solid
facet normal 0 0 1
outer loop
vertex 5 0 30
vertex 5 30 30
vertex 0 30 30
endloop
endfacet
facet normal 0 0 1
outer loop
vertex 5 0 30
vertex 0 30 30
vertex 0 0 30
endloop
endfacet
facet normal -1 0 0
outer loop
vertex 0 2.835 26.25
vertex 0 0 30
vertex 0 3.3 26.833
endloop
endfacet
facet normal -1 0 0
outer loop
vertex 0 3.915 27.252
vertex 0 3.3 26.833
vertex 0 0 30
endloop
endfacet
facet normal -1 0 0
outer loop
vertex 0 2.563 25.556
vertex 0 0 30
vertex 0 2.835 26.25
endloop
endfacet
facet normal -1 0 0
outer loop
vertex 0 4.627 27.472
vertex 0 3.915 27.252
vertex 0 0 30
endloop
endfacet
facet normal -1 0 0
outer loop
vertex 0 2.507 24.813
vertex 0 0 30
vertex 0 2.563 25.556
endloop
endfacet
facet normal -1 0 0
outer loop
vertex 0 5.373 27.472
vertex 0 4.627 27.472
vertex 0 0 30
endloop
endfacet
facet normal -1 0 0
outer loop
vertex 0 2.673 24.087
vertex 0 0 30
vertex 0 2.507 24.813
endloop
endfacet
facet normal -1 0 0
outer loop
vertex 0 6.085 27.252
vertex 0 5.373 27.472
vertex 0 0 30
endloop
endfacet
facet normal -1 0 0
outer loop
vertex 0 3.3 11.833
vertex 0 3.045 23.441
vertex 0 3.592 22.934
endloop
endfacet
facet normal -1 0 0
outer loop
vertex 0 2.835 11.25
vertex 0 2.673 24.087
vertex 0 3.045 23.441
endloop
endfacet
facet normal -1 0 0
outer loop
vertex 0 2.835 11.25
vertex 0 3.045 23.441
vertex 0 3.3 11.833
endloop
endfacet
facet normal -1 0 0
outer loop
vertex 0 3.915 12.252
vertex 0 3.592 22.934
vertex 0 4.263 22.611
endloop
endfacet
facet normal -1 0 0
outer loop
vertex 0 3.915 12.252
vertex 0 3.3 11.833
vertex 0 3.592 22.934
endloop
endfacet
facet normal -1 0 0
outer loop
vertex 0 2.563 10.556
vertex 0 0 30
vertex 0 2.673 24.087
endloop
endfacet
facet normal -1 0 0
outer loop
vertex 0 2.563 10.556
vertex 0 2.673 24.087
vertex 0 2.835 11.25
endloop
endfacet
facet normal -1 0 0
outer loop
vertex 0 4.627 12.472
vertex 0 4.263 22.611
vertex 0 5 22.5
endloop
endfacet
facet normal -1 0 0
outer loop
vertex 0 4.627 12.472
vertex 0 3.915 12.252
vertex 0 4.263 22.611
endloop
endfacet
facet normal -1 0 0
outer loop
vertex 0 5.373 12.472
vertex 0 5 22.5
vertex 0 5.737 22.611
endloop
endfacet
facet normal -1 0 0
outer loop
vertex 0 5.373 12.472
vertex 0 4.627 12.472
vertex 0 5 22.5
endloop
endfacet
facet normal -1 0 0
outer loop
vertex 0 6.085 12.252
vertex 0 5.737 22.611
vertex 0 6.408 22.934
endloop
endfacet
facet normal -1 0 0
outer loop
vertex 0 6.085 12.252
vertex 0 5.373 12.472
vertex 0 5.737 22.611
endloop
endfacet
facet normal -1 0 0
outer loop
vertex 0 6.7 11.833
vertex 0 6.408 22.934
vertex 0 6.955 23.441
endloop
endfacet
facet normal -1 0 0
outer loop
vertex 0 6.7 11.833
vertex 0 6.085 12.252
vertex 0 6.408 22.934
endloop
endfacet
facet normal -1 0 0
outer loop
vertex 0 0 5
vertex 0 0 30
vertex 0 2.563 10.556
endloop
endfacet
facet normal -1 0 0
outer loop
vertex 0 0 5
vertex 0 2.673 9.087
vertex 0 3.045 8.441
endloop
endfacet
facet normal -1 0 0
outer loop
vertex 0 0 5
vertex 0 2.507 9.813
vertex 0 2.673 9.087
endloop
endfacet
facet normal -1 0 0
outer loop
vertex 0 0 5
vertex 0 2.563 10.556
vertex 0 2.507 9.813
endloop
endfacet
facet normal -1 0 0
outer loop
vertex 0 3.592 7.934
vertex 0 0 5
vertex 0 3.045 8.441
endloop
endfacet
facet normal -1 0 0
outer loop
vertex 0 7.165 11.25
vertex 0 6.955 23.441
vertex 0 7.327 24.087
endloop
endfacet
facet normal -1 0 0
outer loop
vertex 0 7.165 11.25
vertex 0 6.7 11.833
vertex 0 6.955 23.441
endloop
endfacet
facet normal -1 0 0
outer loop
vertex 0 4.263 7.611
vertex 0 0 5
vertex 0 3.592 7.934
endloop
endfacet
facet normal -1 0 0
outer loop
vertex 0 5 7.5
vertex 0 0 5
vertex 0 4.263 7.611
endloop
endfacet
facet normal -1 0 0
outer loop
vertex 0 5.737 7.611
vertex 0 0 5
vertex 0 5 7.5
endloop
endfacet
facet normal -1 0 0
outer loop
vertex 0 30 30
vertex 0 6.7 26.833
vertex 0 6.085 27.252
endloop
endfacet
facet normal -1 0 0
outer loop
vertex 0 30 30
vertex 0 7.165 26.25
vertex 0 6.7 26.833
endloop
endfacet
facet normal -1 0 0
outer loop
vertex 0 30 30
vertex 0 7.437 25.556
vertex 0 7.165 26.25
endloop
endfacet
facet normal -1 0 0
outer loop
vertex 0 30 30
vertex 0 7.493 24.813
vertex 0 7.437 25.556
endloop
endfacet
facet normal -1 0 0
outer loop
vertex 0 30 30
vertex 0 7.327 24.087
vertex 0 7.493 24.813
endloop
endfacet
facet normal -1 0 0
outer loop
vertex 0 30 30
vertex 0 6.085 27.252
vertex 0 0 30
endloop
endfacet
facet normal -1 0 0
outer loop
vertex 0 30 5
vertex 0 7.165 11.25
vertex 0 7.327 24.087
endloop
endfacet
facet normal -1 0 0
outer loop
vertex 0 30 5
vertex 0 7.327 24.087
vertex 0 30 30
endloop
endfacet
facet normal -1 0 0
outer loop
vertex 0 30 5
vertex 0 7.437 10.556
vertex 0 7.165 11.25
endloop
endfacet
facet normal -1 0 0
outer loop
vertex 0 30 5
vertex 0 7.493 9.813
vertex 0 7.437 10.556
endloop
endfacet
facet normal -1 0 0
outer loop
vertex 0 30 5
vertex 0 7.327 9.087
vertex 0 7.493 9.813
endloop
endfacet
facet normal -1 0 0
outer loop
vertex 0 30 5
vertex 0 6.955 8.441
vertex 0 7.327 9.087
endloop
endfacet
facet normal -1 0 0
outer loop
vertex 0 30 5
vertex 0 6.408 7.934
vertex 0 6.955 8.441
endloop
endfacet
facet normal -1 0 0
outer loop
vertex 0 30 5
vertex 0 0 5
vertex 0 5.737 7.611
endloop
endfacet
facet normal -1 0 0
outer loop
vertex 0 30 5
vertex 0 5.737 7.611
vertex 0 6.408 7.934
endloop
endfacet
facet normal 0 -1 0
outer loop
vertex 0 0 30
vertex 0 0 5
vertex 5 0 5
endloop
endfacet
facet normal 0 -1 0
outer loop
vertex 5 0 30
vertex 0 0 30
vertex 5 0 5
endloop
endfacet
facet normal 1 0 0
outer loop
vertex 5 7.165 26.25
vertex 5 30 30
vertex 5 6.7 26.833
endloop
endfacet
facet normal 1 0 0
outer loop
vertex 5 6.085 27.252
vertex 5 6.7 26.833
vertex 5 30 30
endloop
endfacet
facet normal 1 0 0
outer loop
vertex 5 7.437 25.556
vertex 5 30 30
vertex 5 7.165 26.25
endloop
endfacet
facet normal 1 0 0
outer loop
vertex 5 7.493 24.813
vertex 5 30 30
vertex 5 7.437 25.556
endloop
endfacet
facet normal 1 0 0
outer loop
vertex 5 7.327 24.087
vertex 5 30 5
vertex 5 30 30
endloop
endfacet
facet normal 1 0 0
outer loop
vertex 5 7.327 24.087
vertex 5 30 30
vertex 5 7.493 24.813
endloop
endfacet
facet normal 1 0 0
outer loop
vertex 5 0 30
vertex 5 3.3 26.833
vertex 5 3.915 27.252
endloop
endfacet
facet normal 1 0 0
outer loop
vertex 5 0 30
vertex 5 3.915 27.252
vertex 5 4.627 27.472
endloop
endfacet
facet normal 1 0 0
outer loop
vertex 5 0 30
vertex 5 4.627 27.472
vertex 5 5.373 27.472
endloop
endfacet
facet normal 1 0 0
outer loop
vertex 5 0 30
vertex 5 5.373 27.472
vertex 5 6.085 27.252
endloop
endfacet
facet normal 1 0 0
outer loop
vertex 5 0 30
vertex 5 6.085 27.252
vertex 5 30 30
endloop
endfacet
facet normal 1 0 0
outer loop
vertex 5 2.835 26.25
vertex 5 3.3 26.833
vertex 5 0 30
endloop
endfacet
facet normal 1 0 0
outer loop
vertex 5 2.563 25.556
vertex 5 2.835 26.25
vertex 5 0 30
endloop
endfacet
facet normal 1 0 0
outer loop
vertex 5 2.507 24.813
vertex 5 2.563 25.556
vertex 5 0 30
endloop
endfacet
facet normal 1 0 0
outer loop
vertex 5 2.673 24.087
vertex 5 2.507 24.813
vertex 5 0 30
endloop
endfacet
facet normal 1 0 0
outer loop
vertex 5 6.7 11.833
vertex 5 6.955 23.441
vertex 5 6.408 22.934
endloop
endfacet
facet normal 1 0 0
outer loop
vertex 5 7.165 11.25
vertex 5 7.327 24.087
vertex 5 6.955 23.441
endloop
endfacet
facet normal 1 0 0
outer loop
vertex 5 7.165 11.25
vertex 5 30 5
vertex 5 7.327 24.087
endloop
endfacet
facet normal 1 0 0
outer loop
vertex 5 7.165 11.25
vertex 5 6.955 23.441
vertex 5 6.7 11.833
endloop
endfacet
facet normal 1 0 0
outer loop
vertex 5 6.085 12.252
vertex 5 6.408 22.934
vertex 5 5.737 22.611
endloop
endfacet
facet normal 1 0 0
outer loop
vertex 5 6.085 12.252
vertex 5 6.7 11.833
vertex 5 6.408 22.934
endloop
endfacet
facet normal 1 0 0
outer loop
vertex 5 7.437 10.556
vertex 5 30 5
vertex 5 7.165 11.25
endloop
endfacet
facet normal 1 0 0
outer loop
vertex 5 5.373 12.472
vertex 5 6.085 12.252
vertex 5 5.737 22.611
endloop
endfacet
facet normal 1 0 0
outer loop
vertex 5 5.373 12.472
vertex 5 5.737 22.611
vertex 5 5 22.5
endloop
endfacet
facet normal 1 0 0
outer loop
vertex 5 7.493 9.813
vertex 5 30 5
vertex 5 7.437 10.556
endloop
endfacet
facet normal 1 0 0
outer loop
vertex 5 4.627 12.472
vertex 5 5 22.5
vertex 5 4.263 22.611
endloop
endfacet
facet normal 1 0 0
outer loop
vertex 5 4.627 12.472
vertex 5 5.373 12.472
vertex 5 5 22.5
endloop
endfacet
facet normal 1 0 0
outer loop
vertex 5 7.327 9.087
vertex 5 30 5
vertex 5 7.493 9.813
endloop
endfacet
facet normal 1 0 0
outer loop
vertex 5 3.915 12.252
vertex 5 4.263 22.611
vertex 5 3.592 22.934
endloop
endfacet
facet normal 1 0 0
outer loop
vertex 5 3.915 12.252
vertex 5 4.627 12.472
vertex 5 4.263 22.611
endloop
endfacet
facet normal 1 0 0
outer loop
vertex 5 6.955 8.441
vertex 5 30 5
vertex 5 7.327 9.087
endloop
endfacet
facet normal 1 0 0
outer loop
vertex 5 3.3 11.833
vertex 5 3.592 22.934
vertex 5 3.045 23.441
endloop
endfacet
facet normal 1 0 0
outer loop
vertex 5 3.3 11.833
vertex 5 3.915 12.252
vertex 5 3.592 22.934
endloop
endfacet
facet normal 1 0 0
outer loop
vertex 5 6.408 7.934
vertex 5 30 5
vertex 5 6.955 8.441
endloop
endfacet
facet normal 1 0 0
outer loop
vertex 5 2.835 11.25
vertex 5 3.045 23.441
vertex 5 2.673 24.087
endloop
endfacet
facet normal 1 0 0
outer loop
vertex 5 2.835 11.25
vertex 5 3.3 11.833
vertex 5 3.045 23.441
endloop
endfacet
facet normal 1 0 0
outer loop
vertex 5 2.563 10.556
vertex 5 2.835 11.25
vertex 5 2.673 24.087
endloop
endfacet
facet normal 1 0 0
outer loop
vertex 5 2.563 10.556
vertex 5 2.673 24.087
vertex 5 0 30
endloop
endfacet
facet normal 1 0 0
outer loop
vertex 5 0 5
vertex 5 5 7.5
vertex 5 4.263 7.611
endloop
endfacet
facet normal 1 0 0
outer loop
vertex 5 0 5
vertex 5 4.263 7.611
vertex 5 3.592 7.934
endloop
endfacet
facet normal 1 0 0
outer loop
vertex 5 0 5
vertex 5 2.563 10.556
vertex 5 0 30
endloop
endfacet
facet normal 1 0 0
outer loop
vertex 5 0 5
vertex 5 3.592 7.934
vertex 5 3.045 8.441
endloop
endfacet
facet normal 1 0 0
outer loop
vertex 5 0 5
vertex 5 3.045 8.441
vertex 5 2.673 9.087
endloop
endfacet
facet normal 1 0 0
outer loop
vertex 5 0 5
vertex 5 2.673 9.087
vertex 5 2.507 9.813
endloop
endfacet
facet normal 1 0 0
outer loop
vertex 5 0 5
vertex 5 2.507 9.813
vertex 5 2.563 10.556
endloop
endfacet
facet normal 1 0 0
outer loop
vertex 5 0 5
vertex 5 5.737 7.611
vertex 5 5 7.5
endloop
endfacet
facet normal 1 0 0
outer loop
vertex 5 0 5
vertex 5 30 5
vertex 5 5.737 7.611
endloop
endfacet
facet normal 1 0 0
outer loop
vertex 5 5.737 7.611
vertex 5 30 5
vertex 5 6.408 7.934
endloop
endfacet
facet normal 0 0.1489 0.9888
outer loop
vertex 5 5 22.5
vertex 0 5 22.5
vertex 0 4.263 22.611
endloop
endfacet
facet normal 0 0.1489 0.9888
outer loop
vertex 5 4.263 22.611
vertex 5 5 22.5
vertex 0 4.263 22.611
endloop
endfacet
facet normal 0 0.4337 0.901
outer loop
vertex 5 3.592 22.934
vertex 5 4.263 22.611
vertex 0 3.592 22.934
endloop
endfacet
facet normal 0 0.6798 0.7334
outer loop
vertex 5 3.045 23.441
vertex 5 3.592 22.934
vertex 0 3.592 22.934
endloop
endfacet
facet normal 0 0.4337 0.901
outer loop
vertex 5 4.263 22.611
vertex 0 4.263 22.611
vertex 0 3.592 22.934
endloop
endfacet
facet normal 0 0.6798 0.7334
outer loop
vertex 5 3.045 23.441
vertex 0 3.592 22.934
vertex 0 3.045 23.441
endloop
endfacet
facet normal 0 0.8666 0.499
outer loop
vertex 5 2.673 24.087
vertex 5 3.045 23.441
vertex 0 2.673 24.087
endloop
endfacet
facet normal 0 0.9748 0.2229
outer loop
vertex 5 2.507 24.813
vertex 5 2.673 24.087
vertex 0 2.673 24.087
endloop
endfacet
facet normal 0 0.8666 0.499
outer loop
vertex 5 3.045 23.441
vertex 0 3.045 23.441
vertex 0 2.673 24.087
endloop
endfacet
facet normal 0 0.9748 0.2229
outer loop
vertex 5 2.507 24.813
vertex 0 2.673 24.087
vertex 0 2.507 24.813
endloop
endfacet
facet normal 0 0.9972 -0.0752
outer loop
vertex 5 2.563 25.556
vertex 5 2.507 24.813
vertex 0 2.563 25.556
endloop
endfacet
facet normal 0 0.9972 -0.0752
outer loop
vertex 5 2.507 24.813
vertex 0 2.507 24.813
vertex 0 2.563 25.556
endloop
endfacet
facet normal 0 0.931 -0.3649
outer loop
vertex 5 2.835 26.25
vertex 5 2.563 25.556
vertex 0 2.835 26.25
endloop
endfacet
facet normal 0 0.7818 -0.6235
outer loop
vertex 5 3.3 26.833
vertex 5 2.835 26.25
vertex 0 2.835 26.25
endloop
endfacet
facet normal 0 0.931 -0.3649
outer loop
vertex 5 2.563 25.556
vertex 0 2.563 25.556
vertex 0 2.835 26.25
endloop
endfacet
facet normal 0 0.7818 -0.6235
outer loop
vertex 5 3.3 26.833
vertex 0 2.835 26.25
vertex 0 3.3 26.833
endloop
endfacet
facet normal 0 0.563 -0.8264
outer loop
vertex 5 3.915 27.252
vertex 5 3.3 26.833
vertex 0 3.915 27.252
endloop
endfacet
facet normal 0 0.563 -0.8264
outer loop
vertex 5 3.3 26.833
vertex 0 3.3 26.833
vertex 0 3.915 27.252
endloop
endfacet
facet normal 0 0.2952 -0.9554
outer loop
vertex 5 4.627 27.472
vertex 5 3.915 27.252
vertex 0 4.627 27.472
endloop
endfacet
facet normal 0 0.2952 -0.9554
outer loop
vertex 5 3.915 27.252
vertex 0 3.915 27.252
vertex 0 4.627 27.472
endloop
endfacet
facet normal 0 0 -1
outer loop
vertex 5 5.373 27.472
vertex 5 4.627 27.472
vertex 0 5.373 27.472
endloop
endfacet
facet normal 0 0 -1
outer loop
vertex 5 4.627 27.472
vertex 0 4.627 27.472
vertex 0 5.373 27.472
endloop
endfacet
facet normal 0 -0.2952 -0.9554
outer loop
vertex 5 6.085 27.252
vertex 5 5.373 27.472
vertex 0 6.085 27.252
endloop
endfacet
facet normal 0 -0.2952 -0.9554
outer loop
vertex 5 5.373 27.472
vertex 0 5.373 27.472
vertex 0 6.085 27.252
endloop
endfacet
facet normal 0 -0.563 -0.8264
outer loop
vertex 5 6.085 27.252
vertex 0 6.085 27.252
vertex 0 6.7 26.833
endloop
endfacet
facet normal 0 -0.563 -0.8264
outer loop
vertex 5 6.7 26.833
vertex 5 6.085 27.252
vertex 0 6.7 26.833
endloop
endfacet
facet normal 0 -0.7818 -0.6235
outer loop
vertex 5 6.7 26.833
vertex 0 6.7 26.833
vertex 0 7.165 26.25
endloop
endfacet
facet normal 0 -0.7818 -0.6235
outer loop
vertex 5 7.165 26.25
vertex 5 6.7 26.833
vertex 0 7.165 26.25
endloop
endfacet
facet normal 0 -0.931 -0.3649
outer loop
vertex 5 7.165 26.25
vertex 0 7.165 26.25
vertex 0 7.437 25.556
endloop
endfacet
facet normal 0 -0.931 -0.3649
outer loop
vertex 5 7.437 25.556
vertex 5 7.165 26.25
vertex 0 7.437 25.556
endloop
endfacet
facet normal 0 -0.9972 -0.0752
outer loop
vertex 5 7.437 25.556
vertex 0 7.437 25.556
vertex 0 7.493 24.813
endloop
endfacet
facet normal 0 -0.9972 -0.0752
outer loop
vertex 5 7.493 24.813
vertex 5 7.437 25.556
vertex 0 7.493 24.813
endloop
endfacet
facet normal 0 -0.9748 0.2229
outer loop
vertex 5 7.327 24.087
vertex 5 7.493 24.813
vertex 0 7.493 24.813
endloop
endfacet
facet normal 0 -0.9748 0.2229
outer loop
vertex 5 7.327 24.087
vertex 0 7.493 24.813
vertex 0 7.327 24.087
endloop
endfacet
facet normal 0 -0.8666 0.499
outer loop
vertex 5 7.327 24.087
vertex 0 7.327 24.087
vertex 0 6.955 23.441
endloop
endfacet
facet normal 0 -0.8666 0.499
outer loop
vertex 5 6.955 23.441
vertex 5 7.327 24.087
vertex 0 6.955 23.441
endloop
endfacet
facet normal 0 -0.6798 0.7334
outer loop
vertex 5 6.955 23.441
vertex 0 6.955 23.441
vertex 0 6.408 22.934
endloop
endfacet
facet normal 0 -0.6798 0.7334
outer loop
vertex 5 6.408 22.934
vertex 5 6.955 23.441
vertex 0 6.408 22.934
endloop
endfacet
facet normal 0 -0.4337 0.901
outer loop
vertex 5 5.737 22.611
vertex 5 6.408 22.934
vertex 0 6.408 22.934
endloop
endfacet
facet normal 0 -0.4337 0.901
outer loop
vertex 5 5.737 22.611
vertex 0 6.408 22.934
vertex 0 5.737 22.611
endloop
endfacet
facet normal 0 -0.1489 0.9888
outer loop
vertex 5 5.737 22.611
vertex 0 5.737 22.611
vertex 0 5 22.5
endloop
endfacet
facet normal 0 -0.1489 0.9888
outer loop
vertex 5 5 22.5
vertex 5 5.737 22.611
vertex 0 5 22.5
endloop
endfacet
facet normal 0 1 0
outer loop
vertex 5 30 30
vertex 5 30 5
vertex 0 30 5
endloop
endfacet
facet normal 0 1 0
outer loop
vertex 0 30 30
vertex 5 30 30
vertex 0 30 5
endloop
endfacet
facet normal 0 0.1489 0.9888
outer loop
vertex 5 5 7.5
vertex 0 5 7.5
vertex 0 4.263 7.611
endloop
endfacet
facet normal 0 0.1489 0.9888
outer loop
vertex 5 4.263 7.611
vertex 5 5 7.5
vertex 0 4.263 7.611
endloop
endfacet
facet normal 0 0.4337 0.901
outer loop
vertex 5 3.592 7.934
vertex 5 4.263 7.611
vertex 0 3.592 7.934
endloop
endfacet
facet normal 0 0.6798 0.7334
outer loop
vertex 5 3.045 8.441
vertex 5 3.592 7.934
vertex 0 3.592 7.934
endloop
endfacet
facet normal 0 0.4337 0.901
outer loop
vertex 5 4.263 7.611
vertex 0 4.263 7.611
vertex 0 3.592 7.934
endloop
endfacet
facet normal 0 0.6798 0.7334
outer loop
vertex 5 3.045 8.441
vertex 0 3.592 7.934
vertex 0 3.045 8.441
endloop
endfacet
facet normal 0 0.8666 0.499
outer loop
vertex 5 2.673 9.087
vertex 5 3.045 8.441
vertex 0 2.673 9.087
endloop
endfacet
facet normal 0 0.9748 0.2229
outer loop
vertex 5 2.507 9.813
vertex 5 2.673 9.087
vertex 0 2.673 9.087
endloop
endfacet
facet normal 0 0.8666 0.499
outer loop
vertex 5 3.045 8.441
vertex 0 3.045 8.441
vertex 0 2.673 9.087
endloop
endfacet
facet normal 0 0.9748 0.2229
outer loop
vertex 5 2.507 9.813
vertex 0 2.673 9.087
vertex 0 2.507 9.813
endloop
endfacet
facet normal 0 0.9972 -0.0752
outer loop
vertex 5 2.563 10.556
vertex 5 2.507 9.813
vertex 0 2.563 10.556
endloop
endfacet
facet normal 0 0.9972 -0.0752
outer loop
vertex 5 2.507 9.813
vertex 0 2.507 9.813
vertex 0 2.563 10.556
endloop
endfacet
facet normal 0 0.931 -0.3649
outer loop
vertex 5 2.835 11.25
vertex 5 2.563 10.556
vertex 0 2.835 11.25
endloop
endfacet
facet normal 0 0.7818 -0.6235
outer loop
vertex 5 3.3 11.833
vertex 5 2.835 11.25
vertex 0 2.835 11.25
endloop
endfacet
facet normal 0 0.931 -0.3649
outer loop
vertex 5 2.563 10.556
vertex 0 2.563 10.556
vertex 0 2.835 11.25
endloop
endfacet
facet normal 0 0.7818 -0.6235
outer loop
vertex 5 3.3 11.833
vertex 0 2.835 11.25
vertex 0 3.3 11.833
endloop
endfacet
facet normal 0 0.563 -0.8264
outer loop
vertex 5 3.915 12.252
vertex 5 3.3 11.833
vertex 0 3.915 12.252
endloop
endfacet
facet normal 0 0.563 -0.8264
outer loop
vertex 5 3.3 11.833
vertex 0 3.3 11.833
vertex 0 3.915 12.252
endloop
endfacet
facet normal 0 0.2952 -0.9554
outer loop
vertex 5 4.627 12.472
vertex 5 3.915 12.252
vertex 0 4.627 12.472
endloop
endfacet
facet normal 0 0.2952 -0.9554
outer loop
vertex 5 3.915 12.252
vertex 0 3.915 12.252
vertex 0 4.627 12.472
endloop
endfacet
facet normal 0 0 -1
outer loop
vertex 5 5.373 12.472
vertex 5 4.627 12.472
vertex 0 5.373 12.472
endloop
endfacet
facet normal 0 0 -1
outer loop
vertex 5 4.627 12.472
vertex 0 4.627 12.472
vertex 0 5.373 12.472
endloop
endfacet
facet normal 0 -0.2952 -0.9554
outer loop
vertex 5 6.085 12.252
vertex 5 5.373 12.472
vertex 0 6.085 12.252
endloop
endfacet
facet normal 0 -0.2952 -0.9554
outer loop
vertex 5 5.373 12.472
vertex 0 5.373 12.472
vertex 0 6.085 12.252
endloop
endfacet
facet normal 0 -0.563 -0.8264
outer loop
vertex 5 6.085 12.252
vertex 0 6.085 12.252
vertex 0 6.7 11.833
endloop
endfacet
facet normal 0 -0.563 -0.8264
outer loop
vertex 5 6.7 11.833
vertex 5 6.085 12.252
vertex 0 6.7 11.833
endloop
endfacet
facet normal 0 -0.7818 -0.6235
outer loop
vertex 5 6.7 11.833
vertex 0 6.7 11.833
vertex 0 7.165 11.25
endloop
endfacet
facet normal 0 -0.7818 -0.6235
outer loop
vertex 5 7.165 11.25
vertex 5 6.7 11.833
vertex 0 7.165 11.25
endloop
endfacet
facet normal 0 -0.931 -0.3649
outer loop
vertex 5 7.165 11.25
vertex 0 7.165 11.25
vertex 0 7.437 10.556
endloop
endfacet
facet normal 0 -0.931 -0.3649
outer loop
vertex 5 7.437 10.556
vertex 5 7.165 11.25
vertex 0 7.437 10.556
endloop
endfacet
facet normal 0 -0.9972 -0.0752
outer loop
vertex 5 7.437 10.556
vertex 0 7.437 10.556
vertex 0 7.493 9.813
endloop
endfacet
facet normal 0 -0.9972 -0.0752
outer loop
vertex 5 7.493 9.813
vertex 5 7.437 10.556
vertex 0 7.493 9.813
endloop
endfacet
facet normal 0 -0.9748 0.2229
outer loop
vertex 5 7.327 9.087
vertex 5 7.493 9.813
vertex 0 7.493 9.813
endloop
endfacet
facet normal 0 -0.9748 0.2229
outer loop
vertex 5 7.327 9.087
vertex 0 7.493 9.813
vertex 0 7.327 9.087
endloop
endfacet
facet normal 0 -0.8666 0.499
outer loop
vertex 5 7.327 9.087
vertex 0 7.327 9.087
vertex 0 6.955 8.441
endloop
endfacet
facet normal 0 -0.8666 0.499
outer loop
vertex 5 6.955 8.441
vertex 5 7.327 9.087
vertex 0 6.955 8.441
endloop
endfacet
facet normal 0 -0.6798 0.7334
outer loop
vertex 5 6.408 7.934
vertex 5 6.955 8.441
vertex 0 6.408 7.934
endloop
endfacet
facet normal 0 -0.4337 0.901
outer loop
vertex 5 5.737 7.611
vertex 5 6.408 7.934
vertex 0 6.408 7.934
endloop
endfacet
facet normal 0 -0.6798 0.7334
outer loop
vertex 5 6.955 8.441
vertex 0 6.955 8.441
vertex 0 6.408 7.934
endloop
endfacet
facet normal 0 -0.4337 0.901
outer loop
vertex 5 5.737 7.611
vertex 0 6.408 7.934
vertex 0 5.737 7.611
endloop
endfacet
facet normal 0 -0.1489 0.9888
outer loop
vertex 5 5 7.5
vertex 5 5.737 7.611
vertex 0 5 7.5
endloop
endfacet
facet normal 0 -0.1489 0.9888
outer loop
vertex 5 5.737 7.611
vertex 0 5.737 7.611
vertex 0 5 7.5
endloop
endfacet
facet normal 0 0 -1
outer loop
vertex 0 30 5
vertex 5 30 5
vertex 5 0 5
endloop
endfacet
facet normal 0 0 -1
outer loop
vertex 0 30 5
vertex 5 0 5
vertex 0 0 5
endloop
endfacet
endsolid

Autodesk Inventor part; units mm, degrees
ref_plane "YZ Plane" through (0, 0, 0) normal (1, 0, 0) x (0, 1, 0)
ref_plane "XZ Plane" through (0, 0, 0) normal (0, 1, 0) x (-1, 0, 0)
ref_plane "XY Plane" through (0, 0, 0) normal (0, 0, 1) x (1, 0, 0)
sketch "スケッチ1" plane through (0, 0, 0) normal (0, 0, 1) x (1, 0, 0)
  line L0 (0, 0) -> (5, 0)
  line L1 (5, 0) -> (5, 30)
  line L2 (5, 30) -> (0, 30)
  line L3 (0, 30) -> (0, 0)
  line L4 (5, 30) -> (15, 30)
  line L5 (15, 30) -> (15, 0)
  line L6 (15, 0) -> (5, 0)
  line L7 (5, 0) -> (5, 30)
  dimension "d0" = 30
  dimension "d1" = 5
  dimension "d2" = 30
  dimension "d3" = 10
extrude "押し出し1" add sketch "スケッチ1" along normal blind 5
sketch "スケッチ2" plane through (0, 0, 5) normal (0, 0, 1) x (1, 0, 0)
  line L0 (15, 0) -> (15, 30) projected
  line L1 (0, 0) -> (15, 0) projected
  line L2 (15, 30) -> (5, 30)
  line L3 (5, 30) -> (5, 0)
  line L4 (5, 0) -> (15, 0)
  line L5 (15, 0) -> (15, 30)
  point P0 (10, 21)
  point P1 (10, 9)
  dimension "d6" = 10
  dimension "d7" = 5
  dimension "d8" = 9
  dimension "d9" = 9
  dimension "d10" = 5
hole "穴1" at (10, 21, 5) at (10, 9, 5) direction (0, 0, -1) diameter 5 depth 8
sketch "スケッチ3" plane through (0, 0, 5) normal (0, 0, 1) x (1, 0, 0)
  line L0 (15, 30) -> (0, 30) projected
  line L1 (0, 0) -> (15, 0) projected
  line L2 (0, 30) -> (5, 30)
  line L3 (5, 30) -> (5, 0)
  line L4 (5, 0) -> (0, 0)
  line L5 (0, 0) -> (0, 30)
  dimension "d18" = 5
extrude "押し出し2" add sketch "スケッチ3" along normal blind 30
sketch "スケッチ4" plane through (5, 0, 5) normal (1, 0, 0) x (0, 0, -1)
  line L0 (-30, 0) -> (-30, 30) projected
  line L1 (0, 0) -> (-30, 0) projected
  line L2 (5, 0) -> (5, 30) projected
  point P0 (-20, 5)
  point P1 (-5, 5)
  dimension "d21" = 15
  dimension "d22" = 10
  dimension "d23" = 5
  dimension "d24" = 5
  dimension "d25" = 10
hole "穴2" at (5, 5, 25) at (5, 5, 10) direction (-1, 0, 0) diameter 5 depth 8
sketch "スケッチ5" plane through (5, 0, 5) normal (1, 0, 0) x (0, 0, -1)
  line L0 (5, 30) -> (-30, 30) projected
  line L1 (-30, 30) -> (-25, 30)
  line L2 (-25, 30) -> (-25, 0)
  line L3 (-25, 0) -> (-30, 0)
  line L4 (-30, 0) -> (-30, 30)
  line L5 (0, 0) -> (0, 30) projected
  circle A0 centre (-5, 5) radius 2.5 projected
  circle A1 centre (-20, 5) radius 2.5 projected
  point P0 (5, 0)
  dimension "d33" = 5
  dimension "d34" = 5
extrude "押し出し3" cut sketch "スケッチ5" against normal through all contours L2 L3 L4 L0
sketch "スケッチ6" plane through (0, 0, 0) normal (0, 0, -1) x (-1, 0, 0)
  line L0 (-35.4456, 44.1041) -> (17.4783, 44.1041)
  line L1 (17.4783, 44.1041) -> (17.4783, -11.5216)
  line L2 (17.4783, -11.5216) -> (-35.4456, -11.5216)
  line L3 (-35.4456, -11.5216) -> (-35.4456, 44.1041)
  point P0 (0, 0)
extrude "押し出し4" cut sketch "スケッチ6" against normal blind 5
equation "\"d9\" = d8"
equation "\"d10\" = d7"
equation "\"d24\" = d23"
equation "\"d34\" = d33"
properties part number "BP_BOX-Support-Bar-Connect2"
